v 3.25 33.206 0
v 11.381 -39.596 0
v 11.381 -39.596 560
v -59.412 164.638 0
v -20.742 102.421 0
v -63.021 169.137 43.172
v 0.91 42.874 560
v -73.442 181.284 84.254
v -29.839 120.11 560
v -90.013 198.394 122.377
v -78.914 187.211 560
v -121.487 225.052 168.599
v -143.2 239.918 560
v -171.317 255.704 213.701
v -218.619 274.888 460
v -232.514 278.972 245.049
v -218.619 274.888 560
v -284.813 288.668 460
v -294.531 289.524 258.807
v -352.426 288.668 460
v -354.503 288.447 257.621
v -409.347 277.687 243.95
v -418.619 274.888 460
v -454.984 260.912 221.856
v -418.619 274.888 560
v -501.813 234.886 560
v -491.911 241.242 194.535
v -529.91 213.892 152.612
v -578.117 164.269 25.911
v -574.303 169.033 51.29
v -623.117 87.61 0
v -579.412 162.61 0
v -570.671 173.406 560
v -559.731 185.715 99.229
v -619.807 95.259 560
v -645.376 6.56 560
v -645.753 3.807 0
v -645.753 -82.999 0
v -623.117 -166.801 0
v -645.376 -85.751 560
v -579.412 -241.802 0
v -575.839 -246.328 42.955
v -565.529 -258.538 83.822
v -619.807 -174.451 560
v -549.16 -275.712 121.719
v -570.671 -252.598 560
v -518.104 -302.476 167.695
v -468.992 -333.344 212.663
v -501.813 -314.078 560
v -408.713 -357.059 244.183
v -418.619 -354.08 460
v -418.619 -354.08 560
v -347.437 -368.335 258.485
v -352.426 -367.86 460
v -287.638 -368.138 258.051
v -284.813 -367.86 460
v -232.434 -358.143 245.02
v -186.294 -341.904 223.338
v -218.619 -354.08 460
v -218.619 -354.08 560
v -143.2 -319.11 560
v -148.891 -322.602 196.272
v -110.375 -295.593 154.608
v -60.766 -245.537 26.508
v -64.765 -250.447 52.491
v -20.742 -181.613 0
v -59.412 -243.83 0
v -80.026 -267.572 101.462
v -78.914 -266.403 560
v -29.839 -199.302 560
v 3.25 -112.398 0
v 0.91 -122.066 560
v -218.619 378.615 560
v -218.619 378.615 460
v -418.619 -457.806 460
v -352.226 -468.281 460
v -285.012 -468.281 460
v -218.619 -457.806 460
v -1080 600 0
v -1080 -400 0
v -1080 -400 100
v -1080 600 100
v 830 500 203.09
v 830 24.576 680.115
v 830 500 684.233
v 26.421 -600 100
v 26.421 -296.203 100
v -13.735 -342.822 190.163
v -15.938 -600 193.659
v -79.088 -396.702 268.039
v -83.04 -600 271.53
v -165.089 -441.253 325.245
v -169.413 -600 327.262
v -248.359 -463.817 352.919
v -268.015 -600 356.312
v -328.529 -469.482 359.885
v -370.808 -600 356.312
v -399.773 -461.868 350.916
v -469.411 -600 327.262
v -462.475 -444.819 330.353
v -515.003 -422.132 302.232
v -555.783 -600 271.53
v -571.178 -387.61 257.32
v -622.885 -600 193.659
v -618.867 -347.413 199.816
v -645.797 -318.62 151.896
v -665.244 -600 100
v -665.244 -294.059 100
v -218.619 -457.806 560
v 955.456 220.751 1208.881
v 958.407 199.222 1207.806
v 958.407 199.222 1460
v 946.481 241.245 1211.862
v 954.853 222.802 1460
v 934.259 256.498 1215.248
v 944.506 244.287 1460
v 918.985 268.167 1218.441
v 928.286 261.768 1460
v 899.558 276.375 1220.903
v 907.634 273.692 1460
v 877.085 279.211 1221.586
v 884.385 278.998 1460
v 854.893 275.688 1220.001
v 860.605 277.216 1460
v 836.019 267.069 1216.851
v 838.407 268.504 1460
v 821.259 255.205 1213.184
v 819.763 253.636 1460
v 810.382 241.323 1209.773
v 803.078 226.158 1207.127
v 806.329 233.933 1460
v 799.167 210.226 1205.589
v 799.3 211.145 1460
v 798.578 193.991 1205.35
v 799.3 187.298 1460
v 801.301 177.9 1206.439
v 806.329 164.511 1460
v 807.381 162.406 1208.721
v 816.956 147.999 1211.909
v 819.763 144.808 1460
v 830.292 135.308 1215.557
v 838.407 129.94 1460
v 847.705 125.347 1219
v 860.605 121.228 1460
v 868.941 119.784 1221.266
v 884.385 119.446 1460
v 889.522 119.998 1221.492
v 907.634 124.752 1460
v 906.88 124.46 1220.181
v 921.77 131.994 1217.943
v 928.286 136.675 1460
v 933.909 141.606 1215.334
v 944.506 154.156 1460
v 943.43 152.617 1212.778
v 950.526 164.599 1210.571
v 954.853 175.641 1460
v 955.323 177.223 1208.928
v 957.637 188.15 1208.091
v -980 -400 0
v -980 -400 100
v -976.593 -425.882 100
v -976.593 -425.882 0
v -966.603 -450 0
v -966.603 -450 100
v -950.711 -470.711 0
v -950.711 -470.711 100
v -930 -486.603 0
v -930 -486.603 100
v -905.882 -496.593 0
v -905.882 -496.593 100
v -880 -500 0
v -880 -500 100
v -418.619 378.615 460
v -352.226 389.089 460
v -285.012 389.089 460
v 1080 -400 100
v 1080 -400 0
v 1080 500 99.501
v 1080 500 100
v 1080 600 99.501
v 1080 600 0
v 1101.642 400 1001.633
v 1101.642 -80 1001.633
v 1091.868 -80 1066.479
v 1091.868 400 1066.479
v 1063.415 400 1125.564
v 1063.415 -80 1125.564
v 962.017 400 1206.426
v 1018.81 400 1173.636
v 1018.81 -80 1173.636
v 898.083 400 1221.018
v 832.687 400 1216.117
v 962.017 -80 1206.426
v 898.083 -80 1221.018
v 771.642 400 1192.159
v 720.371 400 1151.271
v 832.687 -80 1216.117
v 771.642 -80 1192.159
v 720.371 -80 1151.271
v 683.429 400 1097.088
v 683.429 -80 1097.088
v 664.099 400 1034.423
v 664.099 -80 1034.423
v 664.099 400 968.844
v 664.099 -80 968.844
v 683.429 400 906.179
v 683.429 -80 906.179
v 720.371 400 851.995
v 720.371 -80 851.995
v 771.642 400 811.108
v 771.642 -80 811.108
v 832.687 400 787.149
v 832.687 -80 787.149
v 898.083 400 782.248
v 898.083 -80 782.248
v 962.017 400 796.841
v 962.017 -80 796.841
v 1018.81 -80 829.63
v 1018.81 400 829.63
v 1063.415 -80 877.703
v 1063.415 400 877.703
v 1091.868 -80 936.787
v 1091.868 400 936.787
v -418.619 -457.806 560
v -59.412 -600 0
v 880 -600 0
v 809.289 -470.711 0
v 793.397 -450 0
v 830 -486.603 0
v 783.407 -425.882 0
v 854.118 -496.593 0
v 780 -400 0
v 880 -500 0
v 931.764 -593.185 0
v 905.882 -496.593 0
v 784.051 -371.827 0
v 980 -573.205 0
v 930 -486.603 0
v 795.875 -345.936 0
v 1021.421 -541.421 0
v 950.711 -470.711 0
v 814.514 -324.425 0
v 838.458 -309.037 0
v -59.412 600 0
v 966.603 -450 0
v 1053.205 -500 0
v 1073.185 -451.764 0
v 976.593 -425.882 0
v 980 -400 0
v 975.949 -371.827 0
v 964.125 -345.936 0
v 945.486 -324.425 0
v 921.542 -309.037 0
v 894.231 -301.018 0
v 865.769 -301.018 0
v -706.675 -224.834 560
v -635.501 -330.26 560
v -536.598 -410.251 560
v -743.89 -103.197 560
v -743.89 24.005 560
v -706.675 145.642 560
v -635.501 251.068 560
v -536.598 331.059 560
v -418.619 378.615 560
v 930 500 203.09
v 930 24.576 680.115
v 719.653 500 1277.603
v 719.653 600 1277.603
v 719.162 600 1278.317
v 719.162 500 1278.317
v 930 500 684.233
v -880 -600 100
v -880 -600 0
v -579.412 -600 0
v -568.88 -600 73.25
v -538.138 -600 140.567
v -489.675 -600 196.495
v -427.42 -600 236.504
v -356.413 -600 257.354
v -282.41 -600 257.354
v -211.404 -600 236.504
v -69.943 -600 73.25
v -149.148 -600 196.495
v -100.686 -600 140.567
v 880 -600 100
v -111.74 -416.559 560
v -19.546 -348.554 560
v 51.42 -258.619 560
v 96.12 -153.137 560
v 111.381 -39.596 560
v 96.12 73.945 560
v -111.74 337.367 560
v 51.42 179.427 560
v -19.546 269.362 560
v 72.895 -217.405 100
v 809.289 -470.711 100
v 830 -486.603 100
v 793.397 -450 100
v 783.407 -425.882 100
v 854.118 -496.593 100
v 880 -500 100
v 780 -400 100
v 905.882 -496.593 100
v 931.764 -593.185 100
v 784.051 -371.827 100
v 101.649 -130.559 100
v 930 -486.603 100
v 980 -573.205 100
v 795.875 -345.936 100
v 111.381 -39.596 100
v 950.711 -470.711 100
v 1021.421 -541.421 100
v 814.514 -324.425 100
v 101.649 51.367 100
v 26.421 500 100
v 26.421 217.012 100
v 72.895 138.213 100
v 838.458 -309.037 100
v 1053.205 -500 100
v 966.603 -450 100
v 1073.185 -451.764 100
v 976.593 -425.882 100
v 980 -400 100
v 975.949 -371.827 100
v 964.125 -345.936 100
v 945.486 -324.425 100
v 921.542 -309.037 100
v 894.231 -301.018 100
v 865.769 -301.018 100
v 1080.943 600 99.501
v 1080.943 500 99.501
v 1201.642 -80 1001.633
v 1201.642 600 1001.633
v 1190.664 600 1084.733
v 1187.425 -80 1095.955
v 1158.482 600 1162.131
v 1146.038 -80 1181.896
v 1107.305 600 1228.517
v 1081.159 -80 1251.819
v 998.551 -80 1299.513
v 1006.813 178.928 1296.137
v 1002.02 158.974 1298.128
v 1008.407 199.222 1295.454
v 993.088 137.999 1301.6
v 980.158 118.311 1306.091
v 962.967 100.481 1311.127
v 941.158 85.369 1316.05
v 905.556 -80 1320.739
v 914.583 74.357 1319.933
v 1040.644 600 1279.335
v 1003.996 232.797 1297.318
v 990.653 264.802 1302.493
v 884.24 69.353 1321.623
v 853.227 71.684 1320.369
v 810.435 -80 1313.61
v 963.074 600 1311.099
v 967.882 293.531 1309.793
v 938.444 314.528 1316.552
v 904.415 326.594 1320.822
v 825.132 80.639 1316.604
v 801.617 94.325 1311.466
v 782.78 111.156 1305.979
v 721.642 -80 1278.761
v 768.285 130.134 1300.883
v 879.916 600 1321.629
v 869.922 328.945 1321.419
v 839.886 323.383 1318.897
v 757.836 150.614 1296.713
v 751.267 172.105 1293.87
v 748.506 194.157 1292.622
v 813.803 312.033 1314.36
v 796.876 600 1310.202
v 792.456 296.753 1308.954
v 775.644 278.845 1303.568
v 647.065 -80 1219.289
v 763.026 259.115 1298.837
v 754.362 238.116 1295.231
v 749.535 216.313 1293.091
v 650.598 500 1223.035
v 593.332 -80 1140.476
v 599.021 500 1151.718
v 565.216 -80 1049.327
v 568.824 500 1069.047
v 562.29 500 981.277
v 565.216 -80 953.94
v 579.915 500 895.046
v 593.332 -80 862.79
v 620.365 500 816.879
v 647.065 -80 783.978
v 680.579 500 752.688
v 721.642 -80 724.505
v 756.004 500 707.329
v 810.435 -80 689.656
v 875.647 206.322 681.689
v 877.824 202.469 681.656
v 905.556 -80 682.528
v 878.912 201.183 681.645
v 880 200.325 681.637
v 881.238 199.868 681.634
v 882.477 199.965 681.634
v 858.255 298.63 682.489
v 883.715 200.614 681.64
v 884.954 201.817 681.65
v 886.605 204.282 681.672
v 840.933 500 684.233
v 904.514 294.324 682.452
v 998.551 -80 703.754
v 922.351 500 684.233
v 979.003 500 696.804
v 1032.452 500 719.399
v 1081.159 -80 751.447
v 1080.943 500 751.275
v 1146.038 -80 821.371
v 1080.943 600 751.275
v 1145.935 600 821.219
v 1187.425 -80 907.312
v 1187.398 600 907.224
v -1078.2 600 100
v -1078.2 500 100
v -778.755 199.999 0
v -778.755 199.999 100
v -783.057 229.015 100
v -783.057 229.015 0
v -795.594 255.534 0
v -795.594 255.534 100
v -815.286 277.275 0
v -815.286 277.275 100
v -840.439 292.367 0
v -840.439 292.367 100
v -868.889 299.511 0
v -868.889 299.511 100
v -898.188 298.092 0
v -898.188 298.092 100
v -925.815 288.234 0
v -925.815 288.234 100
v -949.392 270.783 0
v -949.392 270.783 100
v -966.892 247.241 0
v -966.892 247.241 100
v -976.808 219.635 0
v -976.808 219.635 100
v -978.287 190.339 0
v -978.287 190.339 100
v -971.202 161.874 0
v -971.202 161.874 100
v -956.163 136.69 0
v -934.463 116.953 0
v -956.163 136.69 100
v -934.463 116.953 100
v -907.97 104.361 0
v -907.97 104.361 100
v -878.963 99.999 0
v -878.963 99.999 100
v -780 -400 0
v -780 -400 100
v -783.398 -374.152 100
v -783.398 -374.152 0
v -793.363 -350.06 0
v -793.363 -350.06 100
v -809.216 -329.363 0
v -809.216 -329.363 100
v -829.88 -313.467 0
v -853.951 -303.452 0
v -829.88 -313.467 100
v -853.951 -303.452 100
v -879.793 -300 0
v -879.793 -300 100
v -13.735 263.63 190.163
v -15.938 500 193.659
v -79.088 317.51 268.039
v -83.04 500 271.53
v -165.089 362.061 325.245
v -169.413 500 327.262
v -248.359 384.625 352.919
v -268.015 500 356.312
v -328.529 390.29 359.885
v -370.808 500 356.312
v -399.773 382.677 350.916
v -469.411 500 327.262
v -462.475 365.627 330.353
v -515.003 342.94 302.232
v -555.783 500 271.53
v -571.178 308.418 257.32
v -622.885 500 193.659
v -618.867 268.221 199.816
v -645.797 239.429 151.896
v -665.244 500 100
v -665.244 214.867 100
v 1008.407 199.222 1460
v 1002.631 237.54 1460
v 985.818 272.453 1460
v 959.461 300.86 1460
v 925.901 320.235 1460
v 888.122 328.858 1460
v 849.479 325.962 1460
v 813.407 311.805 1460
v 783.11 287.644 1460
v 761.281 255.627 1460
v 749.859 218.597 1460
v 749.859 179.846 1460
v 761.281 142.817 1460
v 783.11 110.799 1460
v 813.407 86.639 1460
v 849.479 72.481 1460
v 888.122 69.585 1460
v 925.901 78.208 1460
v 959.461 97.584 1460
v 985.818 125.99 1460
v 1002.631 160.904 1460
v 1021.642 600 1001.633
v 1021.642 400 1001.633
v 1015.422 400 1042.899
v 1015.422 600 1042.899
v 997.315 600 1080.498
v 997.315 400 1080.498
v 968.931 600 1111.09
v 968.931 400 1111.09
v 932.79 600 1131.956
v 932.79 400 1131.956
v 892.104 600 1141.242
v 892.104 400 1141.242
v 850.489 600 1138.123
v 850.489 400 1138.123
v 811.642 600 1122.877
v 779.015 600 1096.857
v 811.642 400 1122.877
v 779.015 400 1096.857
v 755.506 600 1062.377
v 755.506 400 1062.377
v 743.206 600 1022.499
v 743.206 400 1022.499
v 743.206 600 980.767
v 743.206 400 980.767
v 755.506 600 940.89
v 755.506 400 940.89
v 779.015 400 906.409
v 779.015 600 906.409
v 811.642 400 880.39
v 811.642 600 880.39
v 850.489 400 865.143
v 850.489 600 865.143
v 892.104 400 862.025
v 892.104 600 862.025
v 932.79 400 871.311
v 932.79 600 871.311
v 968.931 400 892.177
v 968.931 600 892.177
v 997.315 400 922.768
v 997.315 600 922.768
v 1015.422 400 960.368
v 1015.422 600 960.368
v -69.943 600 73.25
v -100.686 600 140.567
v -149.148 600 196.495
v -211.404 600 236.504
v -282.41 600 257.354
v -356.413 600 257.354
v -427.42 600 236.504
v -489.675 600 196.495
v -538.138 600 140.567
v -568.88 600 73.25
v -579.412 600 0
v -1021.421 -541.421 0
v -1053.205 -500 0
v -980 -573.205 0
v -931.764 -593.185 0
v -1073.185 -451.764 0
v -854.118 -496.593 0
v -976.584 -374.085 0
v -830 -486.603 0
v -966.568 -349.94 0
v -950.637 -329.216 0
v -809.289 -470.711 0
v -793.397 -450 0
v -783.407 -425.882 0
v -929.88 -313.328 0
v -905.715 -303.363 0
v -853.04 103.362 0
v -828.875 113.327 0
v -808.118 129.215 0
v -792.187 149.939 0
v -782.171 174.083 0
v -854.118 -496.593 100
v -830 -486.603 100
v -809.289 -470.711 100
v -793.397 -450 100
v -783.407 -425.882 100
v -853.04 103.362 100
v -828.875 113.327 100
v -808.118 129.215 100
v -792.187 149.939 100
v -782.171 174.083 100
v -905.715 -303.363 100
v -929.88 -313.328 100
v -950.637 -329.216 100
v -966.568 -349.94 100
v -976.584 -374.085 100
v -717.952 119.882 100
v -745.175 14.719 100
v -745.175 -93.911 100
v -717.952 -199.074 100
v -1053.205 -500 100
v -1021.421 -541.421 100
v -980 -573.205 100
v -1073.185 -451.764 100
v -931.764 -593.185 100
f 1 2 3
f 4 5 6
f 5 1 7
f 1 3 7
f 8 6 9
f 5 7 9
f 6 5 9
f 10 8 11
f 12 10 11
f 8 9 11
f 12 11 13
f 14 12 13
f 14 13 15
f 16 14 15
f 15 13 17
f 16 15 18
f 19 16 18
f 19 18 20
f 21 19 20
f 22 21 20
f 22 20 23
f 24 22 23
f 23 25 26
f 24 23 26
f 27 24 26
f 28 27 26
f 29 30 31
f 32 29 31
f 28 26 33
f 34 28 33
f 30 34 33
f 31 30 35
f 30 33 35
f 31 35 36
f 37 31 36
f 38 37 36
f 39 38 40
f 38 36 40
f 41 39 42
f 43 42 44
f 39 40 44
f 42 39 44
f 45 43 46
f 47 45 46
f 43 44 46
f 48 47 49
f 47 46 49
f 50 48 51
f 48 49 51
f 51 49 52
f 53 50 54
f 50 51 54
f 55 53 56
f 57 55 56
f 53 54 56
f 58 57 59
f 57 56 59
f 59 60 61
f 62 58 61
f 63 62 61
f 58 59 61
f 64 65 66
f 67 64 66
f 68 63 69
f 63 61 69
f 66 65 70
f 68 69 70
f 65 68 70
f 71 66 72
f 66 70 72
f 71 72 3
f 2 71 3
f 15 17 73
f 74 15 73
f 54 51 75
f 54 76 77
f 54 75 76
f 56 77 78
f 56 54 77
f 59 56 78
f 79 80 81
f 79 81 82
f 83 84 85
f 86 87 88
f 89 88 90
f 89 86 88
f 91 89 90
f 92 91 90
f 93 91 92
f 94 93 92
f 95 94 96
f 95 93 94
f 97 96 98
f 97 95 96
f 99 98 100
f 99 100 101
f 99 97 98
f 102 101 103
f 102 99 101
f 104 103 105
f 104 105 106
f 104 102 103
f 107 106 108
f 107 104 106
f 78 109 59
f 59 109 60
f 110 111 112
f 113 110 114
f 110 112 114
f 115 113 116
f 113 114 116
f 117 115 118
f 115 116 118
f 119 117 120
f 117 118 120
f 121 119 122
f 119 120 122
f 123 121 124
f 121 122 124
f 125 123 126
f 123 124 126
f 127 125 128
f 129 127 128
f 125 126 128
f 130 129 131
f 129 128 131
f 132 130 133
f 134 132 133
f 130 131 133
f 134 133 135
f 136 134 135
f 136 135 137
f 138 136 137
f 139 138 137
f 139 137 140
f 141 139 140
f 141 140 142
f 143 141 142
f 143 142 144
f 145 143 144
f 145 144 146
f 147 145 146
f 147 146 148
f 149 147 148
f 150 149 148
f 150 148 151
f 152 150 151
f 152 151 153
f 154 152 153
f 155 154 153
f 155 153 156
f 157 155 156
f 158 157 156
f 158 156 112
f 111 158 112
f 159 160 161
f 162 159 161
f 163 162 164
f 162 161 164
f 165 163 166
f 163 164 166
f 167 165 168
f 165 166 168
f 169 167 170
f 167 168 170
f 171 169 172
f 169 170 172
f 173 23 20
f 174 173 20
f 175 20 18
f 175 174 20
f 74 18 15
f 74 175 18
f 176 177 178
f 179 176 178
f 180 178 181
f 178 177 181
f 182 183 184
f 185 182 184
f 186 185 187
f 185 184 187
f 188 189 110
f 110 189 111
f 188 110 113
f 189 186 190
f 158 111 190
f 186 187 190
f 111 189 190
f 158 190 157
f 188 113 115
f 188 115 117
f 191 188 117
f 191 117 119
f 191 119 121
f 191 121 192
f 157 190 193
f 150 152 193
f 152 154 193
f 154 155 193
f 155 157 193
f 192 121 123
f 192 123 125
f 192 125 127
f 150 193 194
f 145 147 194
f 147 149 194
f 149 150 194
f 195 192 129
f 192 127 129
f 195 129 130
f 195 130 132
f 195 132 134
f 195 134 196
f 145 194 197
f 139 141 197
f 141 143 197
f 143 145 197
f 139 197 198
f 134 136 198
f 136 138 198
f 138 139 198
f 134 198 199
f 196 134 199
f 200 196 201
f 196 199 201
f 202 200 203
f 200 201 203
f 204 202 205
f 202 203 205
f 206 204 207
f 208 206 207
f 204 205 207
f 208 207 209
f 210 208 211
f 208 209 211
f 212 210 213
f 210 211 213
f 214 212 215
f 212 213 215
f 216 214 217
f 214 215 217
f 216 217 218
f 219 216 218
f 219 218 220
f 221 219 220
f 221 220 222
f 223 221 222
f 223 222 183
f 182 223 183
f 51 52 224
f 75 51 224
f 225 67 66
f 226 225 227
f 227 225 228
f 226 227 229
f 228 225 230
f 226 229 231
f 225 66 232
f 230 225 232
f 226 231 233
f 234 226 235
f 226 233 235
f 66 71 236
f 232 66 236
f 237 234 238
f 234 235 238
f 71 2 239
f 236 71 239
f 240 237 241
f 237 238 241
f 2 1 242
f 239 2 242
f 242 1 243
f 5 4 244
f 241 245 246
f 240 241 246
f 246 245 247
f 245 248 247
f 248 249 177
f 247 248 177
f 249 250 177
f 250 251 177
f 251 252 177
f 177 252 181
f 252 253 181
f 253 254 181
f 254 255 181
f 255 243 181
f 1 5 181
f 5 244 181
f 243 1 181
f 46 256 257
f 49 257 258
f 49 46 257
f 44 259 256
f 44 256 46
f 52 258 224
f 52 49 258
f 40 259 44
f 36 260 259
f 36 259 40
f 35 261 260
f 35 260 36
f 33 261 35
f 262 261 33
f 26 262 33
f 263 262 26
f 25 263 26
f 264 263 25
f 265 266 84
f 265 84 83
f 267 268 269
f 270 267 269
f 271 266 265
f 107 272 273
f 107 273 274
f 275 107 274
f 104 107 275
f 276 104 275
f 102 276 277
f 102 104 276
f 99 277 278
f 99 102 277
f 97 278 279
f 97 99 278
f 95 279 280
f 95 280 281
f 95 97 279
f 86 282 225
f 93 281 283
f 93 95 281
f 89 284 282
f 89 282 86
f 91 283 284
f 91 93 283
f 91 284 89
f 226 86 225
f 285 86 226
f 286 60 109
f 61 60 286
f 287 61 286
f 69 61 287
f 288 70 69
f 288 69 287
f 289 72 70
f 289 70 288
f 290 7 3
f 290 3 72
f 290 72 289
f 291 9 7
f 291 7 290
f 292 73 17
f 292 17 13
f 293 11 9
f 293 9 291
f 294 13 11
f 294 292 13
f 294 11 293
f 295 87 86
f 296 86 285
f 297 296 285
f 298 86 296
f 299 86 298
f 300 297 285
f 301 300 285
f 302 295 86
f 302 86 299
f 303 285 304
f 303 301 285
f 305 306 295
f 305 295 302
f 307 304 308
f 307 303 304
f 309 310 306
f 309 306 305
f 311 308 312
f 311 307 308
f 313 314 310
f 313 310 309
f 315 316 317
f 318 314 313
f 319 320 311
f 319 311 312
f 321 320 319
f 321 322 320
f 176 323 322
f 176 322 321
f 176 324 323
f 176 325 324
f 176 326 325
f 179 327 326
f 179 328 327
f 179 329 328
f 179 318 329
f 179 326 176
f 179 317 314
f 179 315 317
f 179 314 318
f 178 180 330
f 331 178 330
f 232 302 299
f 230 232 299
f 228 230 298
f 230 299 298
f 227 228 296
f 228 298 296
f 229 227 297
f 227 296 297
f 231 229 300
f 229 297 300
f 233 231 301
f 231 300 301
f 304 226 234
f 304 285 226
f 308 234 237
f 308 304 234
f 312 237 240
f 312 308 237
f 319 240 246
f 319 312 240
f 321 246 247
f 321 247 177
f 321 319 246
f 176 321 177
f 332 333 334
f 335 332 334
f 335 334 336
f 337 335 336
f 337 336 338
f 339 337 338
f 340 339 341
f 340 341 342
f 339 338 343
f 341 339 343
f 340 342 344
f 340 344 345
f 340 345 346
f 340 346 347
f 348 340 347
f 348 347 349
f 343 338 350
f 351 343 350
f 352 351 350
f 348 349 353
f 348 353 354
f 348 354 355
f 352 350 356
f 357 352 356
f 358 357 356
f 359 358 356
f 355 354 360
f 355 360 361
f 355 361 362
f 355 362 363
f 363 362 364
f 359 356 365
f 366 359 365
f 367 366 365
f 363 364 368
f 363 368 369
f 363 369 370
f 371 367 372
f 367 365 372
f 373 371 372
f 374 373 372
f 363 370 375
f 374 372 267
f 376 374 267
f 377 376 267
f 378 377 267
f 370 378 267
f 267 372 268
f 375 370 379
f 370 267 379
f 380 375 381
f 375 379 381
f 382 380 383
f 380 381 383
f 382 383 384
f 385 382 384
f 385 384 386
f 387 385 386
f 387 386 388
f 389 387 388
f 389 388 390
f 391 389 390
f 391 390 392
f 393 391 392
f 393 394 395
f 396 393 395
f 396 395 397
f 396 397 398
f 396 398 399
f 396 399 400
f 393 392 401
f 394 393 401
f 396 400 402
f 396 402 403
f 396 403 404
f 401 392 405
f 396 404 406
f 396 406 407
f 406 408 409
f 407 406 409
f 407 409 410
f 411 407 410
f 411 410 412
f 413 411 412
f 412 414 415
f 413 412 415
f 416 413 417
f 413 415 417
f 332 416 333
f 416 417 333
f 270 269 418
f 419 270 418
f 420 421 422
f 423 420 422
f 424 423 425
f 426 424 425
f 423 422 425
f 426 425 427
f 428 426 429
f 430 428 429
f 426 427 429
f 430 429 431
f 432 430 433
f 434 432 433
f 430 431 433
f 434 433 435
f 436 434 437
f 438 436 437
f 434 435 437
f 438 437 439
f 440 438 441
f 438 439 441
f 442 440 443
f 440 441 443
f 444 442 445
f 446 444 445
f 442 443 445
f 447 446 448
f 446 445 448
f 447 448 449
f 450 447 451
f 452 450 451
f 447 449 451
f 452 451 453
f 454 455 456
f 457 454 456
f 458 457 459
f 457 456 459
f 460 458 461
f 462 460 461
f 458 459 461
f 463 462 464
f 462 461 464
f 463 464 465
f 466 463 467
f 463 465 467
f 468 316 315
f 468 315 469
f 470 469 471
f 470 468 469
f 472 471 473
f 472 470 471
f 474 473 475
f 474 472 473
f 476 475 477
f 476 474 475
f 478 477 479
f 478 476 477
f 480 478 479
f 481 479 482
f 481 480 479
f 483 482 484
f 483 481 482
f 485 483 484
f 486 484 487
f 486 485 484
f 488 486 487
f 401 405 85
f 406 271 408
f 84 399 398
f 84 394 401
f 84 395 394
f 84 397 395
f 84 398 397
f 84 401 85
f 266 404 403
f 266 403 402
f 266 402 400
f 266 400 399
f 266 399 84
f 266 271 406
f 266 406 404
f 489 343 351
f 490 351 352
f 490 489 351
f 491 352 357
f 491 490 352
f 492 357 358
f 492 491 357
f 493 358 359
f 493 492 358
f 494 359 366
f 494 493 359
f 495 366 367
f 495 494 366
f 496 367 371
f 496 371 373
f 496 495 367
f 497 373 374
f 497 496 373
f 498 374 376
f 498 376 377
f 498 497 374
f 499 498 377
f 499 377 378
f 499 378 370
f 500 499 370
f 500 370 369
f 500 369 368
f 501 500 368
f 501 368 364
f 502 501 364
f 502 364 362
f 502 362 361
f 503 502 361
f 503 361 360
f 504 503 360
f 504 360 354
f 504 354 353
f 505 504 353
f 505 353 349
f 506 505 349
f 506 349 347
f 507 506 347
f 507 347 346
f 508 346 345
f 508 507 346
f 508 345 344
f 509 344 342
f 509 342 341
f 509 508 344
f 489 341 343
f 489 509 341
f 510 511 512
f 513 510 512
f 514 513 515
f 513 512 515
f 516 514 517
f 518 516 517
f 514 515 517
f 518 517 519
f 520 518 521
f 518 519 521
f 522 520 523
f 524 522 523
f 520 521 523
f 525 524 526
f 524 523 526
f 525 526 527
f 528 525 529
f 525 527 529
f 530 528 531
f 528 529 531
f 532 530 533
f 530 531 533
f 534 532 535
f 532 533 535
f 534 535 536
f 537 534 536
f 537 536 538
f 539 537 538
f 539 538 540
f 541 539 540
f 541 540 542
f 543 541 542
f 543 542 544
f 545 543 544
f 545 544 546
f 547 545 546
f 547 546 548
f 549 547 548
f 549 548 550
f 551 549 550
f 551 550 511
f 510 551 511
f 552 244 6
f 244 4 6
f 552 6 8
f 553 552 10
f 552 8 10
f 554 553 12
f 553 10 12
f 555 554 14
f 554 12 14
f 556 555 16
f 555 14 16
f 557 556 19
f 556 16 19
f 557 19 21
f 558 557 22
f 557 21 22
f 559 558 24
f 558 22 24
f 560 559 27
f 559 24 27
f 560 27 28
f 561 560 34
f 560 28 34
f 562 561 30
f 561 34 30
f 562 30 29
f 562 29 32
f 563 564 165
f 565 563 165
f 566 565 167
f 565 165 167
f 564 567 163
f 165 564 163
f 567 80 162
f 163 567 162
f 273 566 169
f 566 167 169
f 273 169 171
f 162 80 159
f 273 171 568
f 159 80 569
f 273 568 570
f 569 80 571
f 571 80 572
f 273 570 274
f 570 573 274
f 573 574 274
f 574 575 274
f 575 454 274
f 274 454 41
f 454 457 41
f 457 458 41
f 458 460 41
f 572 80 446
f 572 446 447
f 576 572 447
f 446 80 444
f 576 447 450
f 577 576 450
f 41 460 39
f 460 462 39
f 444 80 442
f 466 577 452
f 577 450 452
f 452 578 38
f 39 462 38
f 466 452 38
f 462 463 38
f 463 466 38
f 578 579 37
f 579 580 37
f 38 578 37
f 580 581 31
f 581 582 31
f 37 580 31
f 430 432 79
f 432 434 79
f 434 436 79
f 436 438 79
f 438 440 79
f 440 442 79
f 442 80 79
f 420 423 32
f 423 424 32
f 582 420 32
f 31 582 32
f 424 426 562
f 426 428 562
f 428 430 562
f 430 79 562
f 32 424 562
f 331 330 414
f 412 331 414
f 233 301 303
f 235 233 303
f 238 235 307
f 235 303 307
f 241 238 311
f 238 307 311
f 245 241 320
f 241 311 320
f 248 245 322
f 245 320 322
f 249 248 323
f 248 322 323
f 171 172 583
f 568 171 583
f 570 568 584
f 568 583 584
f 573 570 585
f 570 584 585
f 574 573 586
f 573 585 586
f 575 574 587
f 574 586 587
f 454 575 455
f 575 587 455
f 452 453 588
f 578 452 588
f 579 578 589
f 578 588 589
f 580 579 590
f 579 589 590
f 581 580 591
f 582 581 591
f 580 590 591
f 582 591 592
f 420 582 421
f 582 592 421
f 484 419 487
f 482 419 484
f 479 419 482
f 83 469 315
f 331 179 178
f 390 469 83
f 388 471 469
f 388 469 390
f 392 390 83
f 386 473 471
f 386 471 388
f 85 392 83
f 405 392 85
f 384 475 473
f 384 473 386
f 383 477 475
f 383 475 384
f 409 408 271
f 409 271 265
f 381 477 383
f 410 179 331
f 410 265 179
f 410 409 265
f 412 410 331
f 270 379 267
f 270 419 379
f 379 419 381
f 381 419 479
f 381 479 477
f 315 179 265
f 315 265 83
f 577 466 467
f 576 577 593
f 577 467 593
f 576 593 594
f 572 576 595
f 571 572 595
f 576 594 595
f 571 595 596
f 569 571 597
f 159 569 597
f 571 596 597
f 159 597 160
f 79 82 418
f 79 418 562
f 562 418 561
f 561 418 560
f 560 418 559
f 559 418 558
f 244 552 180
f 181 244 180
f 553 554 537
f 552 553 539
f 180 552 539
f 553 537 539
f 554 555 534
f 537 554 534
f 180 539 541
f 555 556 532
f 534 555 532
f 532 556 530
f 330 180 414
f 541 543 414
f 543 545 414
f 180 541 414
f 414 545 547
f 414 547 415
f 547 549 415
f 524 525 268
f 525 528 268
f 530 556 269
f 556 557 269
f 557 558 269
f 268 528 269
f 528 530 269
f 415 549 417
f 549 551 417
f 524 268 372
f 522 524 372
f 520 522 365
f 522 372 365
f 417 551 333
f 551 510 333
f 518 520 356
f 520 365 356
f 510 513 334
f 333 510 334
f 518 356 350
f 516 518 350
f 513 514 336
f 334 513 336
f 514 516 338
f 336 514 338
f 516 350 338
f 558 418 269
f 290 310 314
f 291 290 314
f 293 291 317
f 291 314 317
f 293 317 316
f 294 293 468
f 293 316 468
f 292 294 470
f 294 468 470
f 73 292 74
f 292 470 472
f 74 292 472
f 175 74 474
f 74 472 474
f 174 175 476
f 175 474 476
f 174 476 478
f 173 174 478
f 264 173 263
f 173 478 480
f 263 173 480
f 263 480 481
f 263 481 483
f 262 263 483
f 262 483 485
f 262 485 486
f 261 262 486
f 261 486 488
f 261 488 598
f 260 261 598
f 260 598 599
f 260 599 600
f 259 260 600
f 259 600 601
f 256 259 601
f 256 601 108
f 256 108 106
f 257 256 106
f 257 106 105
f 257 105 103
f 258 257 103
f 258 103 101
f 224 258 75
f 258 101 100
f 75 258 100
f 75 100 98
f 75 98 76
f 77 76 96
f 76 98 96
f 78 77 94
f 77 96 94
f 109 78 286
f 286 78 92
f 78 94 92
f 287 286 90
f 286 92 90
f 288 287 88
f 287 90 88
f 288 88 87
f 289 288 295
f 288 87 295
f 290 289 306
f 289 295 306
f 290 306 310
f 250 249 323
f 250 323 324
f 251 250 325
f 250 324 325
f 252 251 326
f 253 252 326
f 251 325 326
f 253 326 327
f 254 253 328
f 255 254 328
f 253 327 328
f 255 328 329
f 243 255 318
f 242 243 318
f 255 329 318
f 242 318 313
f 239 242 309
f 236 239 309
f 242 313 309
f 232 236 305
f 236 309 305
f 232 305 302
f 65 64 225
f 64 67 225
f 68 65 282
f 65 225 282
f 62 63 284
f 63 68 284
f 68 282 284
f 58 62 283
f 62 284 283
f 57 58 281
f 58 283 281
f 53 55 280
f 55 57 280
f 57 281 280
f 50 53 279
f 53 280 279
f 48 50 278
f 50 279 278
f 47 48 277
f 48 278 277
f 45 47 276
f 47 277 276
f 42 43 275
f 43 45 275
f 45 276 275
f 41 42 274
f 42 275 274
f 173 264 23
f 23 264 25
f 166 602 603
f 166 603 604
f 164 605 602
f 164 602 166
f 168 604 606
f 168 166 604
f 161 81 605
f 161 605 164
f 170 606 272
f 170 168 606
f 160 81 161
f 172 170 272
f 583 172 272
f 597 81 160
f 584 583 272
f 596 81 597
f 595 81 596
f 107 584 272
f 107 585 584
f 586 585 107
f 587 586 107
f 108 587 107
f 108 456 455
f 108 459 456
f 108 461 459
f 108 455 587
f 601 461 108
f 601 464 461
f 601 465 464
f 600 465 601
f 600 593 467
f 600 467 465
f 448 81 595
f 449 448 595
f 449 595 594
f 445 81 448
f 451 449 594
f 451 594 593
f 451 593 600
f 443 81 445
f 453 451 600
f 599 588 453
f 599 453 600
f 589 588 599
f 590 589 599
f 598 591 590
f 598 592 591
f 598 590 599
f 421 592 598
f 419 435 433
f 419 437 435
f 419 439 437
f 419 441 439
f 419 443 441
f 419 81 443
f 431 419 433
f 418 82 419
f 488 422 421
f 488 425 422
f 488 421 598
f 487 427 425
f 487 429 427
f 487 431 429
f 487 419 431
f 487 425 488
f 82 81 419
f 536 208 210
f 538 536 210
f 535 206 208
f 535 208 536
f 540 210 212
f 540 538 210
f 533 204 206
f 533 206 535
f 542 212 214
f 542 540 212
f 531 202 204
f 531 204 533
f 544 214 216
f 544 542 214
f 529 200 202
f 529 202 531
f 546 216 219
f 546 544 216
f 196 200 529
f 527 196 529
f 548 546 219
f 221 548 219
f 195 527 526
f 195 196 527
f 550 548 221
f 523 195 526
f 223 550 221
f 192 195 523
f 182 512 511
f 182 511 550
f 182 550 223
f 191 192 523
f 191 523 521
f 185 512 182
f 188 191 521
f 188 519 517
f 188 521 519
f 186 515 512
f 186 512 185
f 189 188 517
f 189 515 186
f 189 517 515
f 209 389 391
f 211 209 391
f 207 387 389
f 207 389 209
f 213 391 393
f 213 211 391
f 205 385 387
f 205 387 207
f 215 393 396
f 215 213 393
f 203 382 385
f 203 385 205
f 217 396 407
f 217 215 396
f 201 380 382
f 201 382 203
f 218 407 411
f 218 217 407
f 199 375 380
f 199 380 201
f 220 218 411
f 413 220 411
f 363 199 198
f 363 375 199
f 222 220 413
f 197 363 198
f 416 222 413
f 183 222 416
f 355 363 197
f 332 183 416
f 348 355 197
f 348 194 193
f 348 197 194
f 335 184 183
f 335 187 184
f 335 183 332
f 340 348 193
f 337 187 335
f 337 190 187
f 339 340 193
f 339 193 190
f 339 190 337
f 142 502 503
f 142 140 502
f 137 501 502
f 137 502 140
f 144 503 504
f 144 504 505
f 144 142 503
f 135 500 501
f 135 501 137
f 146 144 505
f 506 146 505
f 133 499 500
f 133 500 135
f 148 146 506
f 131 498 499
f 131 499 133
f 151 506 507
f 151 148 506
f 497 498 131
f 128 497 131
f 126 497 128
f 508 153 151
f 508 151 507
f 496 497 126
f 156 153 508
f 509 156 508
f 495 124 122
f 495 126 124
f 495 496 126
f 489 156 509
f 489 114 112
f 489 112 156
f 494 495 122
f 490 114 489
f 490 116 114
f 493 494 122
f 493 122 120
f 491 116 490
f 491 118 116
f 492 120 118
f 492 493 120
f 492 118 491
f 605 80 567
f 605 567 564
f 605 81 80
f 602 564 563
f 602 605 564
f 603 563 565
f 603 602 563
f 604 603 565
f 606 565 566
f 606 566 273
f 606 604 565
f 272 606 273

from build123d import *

# Parameters (mm, degrees)
F0_W      = 2160
F0_H      = 1200
F1_DEPTH  = 100
F2_R      = 200
F3_R      = 200
F5_DEPTH  = 100
F6_R      = 430
F7_DEPTH  = 460
F8_W      = 100
F8_H      = 476.0843142867
F9_DEPTH  = 100
F12_DEPTH = 1200
F13_W     = 750
F13_H     = 370
F14_DEPTH = 1200.0010001
F15_R     = 330
F16_DEPTH = 560
F20_DEPTH = 100
F21_DEPTH = 1200.001
F18_R     = 320
F22_DEPTH = 680
F23_R     = 220
F24_DEPTH = 480
F26_R     = 130
F27_DEPTH = 170
F28_R     = 80
F29_DEPTH = 260
F30_R     = 140
F31_DEPTH = 200.0010001
F34_DEPTH = 50
F35_DEPTH = 50


with BuildPart() as f1:
    # F0 (on Top) → F1 (new body)
    with BuildSketch(Plane.XY):
        Rectangle(F0_W, F0_H)
    extrude(amount=F1_DEPTH)

    # F2
    f2_edges = [f1.edges().sort_by_distance(p)[0] for p in [
        (-1080, -600, 50),
    ]]
    fillet(f2_edges, radius=F2_R)

    # F3
    f3_edges = [f1.edges().sort_by_distance(p)[0] for p in [
        (1080, -600, 50),
    ]]
    fillet(f3_edges, radius=F3_R)

    # F4 (on face) → F5 (cut)
    with BuildSketch(Plane.XY.offset(100)):
        with BuildLine():
            Line((980, -400), (880, -400))
            Line((880, -400), (880, -500))
            ThreePointArc((880, -500), (950.7106781187, -470.7106781187), (980, -400))
        make_face()
        with BuildLine():
            ThreePointArc((980, -400), (880, -300), (780, -400))
            Line((780, -400), (880, -400))
            Line((880, -400), (980, -400))
        make_face()
        with BuildLine():
            Line((880, -400), (780, -400))
            ThreePointArc((780, -400), (809.2893218813, -470.7106781187), (880, -500))
            Line((880, -500), (880, -400))
        make_face()
        with BuildLine():
            Line((-880, -400), (-879.7925103978, -300.0002152599))
            ThreePointArc((-879.7925103978, -300.0002152599), (-950.6372813739, -329.2160012424), (-980, -400))
            Line((-980, -400), (-880, -400))
        make_face()
        with BuildLine():
            ThreePointArc((-780, -400), (-809.2160012424, -329.3627186261), (-879.7925103978, -300.0002152599))
            Line((-879.7925103978, -300.0002152599), (-880, -400))
            Line((-880, -400), (-780, -400))
        make_face()
        with BuildLine():
            ThreePointArc((-880, -500), (-809.2893218813, -470.7106781187), (-780, -400))
            Line((-780, -400), (-880, -400))
            Line((-880, -400), (-880, -500))
        make_face()
        with BuildLine():
            Line((-880, -400), (-980, -400))
            ThreePointArc((-980, -400), (-950.7106781187, -470.7106781187), (-880, -500))
            Line((-880, -500), (-880, -400))
        make_face()
        with BuildLine():
            ThreePointArc((-878.9625519891, 99.9989237005), (-808.117781013, 129.214709683), (-778.7550623869, 199.9987084406))
            ThreePointArc((-778.7550623869, 199.9987084406), (-949.3923437608, 270.7827071981), (-878.9625519891, 99.9989237005))
        make_face()
    extrude(amount=-F5_DEPTH, mode=Mode.SUBTRACT)

    # F6 (on face) → F7 (join)
    with BuildSketch(Plane.XY.offset(100)):
        with Locations((-318.6193108559, -39.595939219)):
            Circle(F6_R)
    extrude(amount=F7_DEPTH)

    # F8 (on face) → F9 (cut)
    with BuildSketch(Plane.XY.offset(560)):
        with Locations((-368.6193108559, -277.6380963624)):
            Rectangle(F8_W, F8_H)
        Polygon((-418.6193108559, -39.595939219), (-318.6193108559, -39.595939219), (-218.6193108559, -39.595939219), (-218.6193108559, 463.2783532143), (-418.6193108559, 463.2783532143), align=None)
        with Locations((-268.6193108559, -277.6380963624)):
            Rectangle(F8_W, F8_H)
    extrude(amount=-F9_DEPTH, mode=Mode.SUBTRACT)

    # F11 (on offset) → F12 (join)
    with BuildSketch(Plane.XZ.offset(600)):
        with BuildLine():
            ThreePointArc((40.5883862803, 0), (-64.8531724926, 254.5584412272), (-319.4116137197, 360))
            ThreePointArc((-319.4116137197, 360), (-573.9700549469, -254.5584412272), (40.5883862803, 0))
        make_face()
        with BuildLine():
            ThreePointArc((-59.4116137197, 0), (-503.2593768282, -183.8477631085), (-319.4116137197, 260))
            ThreePointArc((-319.4116137197, 260), (-135.5638506112, 183.8477631085), (-59.4116137197, 0))
        make_face(mode=Mode.SUBTRACT)
    extrude(amount=-F12_DEPTH)

    # F13 (on face) → F14 (cut, through all)
    with BuildSketch(Plane.XZ.offset(600)):
        with Locations((-321.4434087276, -185)):
            Rectangle(F13_W, F13_H)
    extrude(amount=-F14_DEPTH, mode=Mode.SUBTRACT)

    # F15 (on face) → F16 (cut)
    with BuildSketch(Plane.XY.offset(560)):
        with Locations((-318.6193108559, -39.595939219)):
            Circle(F15_R)
    extrude(amount=-F16_DEPTH, mode=Mode.SUBTRACT)

    # F19 (on offset) → F20 (join)
    with BuildSketch(Plane.XZ.offset(-600)):
        Polygon((1080.9426307678, 752.3837089539), (719.1615700722, 1278.3174514771), (-1078.9614915848, 99.5009914041), (1080.9426307678, 99.5009914041), align=None)
    extrude(amount=F20_DEPTH)

    # F11 (on offset) → F21 (cut, through all)
    with BuildSketch(Plane.XZ.offset(600)):
        with BuildLine():
            ThreePointArc((-59.4116137197, 0), (-135.5638506112, 183.8477631085), (-319.4116137197, 260))
            ThreePointArc((-319.4116137197, 260), (-503.2593768282, -183.8477631085), (-59.4116137197, 0))
        make_face()
    extrude(amount=-F21_DEPTH, mode=Mode.SUBTRACT)

    # F18 (on offset) → F22 (join)
    with BuildSketch(Plane.XZ.offset(-600)):
        with Locations((881.6419839859, 1001.6332864761)):
            Circle(F18_R)
    extrude(amount=F22_DEPTH)

    # F23 (on face) → F24 (cut)
    with BuildSketch(Plane.XZ.offset(80)):
        with Locations((881.6419839859, 1001.6332864761)):
            Circle(F23_R)
    extrude(amount=-F24_DEPTH, mode=Mode.SUBTRACT)

    # F26 (on offset) → F27 (join)
    with BuildSketch(Plane.XY.offset(1460)):
        with Locations((878.4069418907, 199.221804738)):
            Circle(F26_R)
    extrude(amount=-F27_DEPTH)

    # F28 (on face) → F29 (cut)
    with BuildSketch(Plane.XY.offset(1460)):
        with Locations((878.4069418907, 199.221804738)):
            Circle(F28_R)
    extrude(amount=-F29_DEPTH, mode=Mode.SUBTRACT)

    # F30 (on face) → F31 (cut, through all)
    with BuildSketch(Plane.XZ.offset(-400)):
        with Locations((881.6419839859, 1001.6332864761)):
            Circle(F30_R)
    extrude(amount=-F31_DEPTH, mode=Mode.SUBTRACT)

    # F33 (on offset) → F34 (join)
    with BuildSketch(Plane.YZ.offset(880)):
        Polygon((502.2943615913, 684.2531561852), (24.5764162391, 680.1151633263), (502.2943615913, 200.7880210876), align=None)
    extrude(amount=F34_DEPTH)

    # F33 (on offset) → F35 (join)
    with BuildSketch(Plane.YZ.offset(880)):
        Polygon((502.2943615913, 684.2531561852), (24.5764162391, 680.1151633263), (502.2943615913, 200.7880210876), align=None)
    extrude(amount=-F35_DEPTH)


solid = f1.part
